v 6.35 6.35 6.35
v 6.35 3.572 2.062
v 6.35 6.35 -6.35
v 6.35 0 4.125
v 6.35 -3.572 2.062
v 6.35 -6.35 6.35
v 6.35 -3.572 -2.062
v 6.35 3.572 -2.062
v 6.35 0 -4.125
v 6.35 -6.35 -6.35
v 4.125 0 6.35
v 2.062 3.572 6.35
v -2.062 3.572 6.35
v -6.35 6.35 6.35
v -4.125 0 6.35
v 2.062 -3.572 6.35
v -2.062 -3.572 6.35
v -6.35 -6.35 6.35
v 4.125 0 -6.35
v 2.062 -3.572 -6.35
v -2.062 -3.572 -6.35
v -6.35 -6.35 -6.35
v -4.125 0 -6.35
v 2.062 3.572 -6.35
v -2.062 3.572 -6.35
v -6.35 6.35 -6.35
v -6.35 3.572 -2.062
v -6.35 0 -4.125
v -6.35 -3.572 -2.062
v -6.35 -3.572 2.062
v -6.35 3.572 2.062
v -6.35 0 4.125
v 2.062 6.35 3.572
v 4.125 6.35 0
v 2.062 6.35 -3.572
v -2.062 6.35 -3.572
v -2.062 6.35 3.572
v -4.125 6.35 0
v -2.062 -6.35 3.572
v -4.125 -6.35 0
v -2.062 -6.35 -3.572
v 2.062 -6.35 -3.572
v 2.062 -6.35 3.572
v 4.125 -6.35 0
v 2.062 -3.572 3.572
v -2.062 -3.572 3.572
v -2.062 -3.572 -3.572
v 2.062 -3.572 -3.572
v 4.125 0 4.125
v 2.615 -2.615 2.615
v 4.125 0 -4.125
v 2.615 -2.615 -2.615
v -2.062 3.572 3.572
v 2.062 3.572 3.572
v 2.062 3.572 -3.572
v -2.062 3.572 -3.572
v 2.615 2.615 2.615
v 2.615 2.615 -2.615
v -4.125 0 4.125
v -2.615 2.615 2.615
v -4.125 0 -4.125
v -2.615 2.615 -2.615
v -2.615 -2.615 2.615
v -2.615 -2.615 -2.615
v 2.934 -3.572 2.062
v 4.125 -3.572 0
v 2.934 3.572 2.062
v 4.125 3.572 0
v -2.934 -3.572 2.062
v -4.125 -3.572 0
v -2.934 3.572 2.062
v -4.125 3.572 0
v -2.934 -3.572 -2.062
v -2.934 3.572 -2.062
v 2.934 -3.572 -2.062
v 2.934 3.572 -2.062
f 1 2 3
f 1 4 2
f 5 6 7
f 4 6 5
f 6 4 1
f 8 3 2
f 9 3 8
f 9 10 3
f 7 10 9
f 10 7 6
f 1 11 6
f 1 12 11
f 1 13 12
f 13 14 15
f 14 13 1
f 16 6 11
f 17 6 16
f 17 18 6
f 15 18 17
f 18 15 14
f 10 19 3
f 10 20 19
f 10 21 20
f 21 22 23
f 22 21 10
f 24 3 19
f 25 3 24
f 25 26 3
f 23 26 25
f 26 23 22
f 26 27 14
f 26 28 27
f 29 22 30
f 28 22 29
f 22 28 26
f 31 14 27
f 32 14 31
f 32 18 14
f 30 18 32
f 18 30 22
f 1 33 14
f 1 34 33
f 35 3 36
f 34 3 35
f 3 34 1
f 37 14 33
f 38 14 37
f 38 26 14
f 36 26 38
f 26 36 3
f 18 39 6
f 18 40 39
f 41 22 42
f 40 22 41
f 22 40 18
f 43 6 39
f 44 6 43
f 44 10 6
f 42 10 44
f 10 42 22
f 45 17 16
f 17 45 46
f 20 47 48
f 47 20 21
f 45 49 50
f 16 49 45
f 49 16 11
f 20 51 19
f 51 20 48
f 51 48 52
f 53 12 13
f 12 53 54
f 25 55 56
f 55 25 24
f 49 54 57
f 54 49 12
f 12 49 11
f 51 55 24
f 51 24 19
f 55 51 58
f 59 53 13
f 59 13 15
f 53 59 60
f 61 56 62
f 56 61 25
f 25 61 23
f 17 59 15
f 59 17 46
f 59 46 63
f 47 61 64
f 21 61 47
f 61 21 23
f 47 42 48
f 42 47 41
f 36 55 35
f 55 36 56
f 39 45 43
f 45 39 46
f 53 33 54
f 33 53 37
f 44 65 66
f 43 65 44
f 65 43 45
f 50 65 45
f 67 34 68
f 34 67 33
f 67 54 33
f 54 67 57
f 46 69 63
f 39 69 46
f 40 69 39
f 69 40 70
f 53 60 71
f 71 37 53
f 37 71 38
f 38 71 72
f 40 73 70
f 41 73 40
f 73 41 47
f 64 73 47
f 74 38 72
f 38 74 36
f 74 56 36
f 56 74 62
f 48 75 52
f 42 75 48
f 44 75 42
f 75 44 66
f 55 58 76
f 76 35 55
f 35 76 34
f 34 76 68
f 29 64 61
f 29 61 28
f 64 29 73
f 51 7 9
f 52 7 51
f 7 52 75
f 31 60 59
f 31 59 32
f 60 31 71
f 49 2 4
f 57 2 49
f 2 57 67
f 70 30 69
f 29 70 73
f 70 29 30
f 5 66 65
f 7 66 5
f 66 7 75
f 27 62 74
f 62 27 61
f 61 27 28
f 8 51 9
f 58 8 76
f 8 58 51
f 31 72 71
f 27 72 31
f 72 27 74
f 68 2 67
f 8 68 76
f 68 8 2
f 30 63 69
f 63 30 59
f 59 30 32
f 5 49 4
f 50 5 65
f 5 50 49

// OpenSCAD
in=25.4;
l=in/2;
d=0.5+7.75; //size for a standard pencil

echo(l=l);
echo(d=d);

$fn=6;
difference() {
    cube(l,l,l, center=true);
    cylinder(d=d, h=l*2, center=true);
    rotate([90, 0, 0])     cylinder(d=d, h=l*2, center=true);
    rotate([0, 90, 0])     cylinder(d=d, h=l*2, center=true);
}
